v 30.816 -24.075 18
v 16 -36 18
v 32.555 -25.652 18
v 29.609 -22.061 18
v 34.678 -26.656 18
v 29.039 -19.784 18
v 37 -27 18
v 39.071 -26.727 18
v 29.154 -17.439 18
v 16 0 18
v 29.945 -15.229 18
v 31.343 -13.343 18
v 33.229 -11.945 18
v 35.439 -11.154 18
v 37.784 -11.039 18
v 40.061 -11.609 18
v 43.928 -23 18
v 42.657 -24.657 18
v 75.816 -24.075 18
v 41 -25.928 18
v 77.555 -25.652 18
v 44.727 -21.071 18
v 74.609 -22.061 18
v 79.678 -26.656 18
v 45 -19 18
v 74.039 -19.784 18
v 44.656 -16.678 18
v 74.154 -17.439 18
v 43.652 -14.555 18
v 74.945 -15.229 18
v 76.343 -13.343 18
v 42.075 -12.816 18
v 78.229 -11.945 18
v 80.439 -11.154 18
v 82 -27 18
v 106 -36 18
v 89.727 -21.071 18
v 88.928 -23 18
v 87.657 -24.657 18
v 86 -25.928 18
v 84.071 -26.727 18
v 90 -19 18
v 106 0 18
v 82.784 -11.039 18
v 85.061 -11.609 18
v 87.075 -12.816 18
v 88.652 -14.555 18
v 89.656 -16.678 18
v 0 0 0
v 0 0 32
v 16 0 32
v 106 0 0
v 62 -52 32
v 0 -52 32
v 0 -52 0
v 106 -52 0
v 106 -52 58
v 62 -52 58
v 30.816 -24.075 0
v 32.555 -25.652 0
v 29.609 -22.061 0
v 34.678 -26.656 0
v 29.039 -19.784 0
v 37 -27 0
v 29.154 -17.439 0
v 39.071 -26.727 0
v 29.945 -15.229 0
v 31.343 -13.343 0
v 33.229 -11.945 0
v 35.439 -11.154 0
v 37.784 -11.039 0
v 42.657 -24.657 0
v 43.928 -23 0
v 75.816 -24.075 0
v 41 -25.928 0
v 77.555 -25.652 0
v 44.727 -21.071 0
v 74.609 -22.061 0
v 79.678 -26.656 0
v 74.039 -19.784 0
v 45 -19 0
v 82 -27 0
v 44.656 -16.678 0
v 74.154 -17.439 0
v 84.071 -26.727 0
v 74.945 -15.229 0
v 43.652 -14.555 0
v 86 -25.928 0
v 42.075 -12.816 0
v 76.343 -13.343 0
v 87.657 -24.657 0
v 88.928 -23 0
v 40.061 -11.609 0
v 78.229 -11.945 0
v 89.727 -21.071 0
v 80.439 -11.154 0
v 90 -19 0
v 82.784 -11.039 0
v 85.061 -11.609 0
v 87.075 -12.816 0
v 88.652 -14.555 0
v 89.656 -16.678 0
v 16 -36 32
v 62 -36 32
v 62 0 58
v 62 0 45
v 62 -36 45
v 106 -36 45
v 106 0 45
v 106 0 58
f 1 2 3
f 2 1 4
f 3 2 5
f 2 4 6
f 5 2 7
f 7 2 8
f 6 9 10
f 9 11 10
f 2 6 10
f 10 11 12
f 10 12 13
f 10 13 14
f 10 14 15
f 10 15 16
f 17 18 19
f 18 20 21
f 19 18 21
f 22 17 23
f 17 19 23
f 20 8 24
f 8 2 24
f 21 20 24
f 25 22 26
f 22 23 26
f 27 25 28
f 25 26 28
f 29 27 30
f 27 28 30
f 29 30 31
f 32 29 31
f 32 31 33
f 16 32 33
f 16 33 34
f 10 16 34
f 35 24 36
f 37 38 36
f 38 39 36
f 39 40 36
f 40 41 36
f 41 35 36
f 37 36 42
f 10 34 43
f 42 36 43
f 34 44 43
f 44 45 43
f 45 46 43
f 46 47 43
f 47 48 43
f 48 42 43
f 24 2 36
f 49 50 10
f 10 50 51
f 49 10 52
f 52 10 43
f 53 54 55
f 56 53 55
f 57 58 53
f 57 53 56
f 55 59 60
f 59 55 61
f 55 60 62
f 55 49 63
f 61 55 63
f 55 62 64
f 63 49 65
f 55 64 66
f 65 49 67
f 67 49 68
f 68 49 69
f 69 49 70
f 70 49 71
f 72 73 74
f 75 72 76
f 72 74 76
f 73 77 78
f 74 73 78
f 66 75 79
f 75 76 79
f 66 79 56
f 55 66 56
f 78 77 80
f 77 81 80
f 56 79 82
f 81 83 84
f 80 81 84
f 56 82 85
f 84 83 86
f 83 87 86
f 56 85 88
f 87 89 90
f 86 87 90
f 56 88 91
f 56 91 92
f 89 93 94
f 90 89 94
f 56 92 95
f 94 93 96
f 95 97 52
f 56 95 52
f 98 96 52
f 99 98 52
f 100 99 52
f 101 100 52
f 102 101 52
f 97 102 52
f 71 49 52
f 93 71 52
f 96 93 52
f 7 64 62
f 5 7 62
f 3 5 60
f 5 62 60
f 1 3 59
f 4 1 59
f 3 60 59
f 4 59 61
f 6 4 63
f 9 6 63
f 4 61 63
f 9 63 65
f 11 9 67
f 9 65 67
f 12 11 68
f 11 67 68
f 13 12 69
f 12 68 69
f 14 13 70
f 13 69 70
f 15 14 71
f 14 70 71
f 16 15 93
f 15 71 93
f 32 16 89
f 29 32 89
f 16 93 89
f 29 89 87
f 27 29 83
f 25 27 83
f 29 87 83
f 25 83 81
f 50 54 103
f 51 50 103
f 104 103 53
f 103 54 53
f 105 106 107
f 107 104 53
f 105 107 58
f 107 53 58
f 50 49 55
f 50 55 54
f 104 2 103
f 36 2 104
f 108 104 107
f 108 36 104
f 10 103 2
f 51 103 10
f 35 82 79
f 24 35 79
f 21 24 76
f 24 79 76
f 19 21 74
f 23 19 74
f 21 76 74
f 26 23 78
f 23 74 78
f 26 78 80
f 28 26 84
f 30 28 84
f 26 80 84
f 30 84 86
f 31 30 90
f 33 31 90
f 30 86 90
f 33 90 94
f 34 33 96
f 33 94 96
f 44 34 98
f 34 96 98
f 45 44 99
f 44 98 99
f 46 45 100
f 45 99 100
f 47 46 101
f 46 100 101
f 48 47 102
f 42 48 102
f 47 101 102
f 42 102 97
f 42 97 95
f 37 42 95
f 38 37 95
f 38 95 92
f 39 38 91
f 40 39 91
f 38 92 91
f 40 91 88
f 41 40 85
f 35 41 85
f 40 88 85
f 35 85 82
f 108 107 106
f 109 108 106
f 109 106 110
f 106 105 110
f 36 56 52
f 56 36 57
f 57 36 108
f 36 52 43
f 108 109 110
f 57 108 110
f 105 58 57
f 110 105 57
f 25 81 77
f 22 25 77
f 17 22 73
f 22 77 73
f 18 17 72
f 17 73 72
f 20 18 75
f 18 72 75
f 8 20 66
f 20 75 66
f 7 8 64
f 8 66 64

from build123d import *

# Parameters (mm, degrees)
F0_W     = 106
F0_H     = 58
F1_DEPTH = 52
F2_W     = 62
F2_H     = 26
F3_DEPTH = 52.001
F4_W     = 36
F4_H     = 27
F5_DEPTH = 90
F7_DEPTH = 18


with BuildPart() as f1:
    # F0 (on Front) → F1 (new body)
    with BuildSketch(Plane.XZ):
        with Locations((53, 29)):
            Rectangle(F0_W, F0_H)
    extrude(amount=F1_DEPTH)

    # F2 (on face) → F3 (cut, through all)
    with BuildSketch(Plane.XZ.offset(52)):
        with Locations((31, 45)):
            Rectangle(F2_W, F2_H)
    extrude(amount=-F3_DEPTH, mode=Mode.SUBTRACT)

    # F4 (on face) → F5 (cut)
    with BuildSketch(Plane.YZ.offset(106)):
        with Locations((-18, 31.5)):
            Rectangle(F4_W, F4_H)
    extrude(amount=-F5_DEPTH, mode=Mode.SUBTRACT)

    # F6 (on face) → F7 (cut)
    with BuildSketch(Plane(origin=(0, 0, 0), x_dir=(1, 0, 0), z_dir=(0, 0, -1))):
        with BuildLine():
            ThreePointArc((82, 27), (76.343146, 13.343146), (90, 19))
            Line((90, 19), (82, 19))
            Line((82, 19), (82, 27))
        make_face()
        with BuildLine():
            Line((82, 19), (90, 19))
            ThreePointArc((90, 19), (87.656854, 24.656854), (82, 27))
            Line((82, 27), (82, 19))
        make_face()
        with BuildLine():
            ThreePointArc((45, 19), (42.656854, 24.656854), (37, 27))
            ThreePointArc((37, 27), (31.343146, 13.343146), (45, 19))
        make_face()
    extrude(amount=-F7_DEPTH, mode=Mode.SUBTRACT)


solid = f1.part
